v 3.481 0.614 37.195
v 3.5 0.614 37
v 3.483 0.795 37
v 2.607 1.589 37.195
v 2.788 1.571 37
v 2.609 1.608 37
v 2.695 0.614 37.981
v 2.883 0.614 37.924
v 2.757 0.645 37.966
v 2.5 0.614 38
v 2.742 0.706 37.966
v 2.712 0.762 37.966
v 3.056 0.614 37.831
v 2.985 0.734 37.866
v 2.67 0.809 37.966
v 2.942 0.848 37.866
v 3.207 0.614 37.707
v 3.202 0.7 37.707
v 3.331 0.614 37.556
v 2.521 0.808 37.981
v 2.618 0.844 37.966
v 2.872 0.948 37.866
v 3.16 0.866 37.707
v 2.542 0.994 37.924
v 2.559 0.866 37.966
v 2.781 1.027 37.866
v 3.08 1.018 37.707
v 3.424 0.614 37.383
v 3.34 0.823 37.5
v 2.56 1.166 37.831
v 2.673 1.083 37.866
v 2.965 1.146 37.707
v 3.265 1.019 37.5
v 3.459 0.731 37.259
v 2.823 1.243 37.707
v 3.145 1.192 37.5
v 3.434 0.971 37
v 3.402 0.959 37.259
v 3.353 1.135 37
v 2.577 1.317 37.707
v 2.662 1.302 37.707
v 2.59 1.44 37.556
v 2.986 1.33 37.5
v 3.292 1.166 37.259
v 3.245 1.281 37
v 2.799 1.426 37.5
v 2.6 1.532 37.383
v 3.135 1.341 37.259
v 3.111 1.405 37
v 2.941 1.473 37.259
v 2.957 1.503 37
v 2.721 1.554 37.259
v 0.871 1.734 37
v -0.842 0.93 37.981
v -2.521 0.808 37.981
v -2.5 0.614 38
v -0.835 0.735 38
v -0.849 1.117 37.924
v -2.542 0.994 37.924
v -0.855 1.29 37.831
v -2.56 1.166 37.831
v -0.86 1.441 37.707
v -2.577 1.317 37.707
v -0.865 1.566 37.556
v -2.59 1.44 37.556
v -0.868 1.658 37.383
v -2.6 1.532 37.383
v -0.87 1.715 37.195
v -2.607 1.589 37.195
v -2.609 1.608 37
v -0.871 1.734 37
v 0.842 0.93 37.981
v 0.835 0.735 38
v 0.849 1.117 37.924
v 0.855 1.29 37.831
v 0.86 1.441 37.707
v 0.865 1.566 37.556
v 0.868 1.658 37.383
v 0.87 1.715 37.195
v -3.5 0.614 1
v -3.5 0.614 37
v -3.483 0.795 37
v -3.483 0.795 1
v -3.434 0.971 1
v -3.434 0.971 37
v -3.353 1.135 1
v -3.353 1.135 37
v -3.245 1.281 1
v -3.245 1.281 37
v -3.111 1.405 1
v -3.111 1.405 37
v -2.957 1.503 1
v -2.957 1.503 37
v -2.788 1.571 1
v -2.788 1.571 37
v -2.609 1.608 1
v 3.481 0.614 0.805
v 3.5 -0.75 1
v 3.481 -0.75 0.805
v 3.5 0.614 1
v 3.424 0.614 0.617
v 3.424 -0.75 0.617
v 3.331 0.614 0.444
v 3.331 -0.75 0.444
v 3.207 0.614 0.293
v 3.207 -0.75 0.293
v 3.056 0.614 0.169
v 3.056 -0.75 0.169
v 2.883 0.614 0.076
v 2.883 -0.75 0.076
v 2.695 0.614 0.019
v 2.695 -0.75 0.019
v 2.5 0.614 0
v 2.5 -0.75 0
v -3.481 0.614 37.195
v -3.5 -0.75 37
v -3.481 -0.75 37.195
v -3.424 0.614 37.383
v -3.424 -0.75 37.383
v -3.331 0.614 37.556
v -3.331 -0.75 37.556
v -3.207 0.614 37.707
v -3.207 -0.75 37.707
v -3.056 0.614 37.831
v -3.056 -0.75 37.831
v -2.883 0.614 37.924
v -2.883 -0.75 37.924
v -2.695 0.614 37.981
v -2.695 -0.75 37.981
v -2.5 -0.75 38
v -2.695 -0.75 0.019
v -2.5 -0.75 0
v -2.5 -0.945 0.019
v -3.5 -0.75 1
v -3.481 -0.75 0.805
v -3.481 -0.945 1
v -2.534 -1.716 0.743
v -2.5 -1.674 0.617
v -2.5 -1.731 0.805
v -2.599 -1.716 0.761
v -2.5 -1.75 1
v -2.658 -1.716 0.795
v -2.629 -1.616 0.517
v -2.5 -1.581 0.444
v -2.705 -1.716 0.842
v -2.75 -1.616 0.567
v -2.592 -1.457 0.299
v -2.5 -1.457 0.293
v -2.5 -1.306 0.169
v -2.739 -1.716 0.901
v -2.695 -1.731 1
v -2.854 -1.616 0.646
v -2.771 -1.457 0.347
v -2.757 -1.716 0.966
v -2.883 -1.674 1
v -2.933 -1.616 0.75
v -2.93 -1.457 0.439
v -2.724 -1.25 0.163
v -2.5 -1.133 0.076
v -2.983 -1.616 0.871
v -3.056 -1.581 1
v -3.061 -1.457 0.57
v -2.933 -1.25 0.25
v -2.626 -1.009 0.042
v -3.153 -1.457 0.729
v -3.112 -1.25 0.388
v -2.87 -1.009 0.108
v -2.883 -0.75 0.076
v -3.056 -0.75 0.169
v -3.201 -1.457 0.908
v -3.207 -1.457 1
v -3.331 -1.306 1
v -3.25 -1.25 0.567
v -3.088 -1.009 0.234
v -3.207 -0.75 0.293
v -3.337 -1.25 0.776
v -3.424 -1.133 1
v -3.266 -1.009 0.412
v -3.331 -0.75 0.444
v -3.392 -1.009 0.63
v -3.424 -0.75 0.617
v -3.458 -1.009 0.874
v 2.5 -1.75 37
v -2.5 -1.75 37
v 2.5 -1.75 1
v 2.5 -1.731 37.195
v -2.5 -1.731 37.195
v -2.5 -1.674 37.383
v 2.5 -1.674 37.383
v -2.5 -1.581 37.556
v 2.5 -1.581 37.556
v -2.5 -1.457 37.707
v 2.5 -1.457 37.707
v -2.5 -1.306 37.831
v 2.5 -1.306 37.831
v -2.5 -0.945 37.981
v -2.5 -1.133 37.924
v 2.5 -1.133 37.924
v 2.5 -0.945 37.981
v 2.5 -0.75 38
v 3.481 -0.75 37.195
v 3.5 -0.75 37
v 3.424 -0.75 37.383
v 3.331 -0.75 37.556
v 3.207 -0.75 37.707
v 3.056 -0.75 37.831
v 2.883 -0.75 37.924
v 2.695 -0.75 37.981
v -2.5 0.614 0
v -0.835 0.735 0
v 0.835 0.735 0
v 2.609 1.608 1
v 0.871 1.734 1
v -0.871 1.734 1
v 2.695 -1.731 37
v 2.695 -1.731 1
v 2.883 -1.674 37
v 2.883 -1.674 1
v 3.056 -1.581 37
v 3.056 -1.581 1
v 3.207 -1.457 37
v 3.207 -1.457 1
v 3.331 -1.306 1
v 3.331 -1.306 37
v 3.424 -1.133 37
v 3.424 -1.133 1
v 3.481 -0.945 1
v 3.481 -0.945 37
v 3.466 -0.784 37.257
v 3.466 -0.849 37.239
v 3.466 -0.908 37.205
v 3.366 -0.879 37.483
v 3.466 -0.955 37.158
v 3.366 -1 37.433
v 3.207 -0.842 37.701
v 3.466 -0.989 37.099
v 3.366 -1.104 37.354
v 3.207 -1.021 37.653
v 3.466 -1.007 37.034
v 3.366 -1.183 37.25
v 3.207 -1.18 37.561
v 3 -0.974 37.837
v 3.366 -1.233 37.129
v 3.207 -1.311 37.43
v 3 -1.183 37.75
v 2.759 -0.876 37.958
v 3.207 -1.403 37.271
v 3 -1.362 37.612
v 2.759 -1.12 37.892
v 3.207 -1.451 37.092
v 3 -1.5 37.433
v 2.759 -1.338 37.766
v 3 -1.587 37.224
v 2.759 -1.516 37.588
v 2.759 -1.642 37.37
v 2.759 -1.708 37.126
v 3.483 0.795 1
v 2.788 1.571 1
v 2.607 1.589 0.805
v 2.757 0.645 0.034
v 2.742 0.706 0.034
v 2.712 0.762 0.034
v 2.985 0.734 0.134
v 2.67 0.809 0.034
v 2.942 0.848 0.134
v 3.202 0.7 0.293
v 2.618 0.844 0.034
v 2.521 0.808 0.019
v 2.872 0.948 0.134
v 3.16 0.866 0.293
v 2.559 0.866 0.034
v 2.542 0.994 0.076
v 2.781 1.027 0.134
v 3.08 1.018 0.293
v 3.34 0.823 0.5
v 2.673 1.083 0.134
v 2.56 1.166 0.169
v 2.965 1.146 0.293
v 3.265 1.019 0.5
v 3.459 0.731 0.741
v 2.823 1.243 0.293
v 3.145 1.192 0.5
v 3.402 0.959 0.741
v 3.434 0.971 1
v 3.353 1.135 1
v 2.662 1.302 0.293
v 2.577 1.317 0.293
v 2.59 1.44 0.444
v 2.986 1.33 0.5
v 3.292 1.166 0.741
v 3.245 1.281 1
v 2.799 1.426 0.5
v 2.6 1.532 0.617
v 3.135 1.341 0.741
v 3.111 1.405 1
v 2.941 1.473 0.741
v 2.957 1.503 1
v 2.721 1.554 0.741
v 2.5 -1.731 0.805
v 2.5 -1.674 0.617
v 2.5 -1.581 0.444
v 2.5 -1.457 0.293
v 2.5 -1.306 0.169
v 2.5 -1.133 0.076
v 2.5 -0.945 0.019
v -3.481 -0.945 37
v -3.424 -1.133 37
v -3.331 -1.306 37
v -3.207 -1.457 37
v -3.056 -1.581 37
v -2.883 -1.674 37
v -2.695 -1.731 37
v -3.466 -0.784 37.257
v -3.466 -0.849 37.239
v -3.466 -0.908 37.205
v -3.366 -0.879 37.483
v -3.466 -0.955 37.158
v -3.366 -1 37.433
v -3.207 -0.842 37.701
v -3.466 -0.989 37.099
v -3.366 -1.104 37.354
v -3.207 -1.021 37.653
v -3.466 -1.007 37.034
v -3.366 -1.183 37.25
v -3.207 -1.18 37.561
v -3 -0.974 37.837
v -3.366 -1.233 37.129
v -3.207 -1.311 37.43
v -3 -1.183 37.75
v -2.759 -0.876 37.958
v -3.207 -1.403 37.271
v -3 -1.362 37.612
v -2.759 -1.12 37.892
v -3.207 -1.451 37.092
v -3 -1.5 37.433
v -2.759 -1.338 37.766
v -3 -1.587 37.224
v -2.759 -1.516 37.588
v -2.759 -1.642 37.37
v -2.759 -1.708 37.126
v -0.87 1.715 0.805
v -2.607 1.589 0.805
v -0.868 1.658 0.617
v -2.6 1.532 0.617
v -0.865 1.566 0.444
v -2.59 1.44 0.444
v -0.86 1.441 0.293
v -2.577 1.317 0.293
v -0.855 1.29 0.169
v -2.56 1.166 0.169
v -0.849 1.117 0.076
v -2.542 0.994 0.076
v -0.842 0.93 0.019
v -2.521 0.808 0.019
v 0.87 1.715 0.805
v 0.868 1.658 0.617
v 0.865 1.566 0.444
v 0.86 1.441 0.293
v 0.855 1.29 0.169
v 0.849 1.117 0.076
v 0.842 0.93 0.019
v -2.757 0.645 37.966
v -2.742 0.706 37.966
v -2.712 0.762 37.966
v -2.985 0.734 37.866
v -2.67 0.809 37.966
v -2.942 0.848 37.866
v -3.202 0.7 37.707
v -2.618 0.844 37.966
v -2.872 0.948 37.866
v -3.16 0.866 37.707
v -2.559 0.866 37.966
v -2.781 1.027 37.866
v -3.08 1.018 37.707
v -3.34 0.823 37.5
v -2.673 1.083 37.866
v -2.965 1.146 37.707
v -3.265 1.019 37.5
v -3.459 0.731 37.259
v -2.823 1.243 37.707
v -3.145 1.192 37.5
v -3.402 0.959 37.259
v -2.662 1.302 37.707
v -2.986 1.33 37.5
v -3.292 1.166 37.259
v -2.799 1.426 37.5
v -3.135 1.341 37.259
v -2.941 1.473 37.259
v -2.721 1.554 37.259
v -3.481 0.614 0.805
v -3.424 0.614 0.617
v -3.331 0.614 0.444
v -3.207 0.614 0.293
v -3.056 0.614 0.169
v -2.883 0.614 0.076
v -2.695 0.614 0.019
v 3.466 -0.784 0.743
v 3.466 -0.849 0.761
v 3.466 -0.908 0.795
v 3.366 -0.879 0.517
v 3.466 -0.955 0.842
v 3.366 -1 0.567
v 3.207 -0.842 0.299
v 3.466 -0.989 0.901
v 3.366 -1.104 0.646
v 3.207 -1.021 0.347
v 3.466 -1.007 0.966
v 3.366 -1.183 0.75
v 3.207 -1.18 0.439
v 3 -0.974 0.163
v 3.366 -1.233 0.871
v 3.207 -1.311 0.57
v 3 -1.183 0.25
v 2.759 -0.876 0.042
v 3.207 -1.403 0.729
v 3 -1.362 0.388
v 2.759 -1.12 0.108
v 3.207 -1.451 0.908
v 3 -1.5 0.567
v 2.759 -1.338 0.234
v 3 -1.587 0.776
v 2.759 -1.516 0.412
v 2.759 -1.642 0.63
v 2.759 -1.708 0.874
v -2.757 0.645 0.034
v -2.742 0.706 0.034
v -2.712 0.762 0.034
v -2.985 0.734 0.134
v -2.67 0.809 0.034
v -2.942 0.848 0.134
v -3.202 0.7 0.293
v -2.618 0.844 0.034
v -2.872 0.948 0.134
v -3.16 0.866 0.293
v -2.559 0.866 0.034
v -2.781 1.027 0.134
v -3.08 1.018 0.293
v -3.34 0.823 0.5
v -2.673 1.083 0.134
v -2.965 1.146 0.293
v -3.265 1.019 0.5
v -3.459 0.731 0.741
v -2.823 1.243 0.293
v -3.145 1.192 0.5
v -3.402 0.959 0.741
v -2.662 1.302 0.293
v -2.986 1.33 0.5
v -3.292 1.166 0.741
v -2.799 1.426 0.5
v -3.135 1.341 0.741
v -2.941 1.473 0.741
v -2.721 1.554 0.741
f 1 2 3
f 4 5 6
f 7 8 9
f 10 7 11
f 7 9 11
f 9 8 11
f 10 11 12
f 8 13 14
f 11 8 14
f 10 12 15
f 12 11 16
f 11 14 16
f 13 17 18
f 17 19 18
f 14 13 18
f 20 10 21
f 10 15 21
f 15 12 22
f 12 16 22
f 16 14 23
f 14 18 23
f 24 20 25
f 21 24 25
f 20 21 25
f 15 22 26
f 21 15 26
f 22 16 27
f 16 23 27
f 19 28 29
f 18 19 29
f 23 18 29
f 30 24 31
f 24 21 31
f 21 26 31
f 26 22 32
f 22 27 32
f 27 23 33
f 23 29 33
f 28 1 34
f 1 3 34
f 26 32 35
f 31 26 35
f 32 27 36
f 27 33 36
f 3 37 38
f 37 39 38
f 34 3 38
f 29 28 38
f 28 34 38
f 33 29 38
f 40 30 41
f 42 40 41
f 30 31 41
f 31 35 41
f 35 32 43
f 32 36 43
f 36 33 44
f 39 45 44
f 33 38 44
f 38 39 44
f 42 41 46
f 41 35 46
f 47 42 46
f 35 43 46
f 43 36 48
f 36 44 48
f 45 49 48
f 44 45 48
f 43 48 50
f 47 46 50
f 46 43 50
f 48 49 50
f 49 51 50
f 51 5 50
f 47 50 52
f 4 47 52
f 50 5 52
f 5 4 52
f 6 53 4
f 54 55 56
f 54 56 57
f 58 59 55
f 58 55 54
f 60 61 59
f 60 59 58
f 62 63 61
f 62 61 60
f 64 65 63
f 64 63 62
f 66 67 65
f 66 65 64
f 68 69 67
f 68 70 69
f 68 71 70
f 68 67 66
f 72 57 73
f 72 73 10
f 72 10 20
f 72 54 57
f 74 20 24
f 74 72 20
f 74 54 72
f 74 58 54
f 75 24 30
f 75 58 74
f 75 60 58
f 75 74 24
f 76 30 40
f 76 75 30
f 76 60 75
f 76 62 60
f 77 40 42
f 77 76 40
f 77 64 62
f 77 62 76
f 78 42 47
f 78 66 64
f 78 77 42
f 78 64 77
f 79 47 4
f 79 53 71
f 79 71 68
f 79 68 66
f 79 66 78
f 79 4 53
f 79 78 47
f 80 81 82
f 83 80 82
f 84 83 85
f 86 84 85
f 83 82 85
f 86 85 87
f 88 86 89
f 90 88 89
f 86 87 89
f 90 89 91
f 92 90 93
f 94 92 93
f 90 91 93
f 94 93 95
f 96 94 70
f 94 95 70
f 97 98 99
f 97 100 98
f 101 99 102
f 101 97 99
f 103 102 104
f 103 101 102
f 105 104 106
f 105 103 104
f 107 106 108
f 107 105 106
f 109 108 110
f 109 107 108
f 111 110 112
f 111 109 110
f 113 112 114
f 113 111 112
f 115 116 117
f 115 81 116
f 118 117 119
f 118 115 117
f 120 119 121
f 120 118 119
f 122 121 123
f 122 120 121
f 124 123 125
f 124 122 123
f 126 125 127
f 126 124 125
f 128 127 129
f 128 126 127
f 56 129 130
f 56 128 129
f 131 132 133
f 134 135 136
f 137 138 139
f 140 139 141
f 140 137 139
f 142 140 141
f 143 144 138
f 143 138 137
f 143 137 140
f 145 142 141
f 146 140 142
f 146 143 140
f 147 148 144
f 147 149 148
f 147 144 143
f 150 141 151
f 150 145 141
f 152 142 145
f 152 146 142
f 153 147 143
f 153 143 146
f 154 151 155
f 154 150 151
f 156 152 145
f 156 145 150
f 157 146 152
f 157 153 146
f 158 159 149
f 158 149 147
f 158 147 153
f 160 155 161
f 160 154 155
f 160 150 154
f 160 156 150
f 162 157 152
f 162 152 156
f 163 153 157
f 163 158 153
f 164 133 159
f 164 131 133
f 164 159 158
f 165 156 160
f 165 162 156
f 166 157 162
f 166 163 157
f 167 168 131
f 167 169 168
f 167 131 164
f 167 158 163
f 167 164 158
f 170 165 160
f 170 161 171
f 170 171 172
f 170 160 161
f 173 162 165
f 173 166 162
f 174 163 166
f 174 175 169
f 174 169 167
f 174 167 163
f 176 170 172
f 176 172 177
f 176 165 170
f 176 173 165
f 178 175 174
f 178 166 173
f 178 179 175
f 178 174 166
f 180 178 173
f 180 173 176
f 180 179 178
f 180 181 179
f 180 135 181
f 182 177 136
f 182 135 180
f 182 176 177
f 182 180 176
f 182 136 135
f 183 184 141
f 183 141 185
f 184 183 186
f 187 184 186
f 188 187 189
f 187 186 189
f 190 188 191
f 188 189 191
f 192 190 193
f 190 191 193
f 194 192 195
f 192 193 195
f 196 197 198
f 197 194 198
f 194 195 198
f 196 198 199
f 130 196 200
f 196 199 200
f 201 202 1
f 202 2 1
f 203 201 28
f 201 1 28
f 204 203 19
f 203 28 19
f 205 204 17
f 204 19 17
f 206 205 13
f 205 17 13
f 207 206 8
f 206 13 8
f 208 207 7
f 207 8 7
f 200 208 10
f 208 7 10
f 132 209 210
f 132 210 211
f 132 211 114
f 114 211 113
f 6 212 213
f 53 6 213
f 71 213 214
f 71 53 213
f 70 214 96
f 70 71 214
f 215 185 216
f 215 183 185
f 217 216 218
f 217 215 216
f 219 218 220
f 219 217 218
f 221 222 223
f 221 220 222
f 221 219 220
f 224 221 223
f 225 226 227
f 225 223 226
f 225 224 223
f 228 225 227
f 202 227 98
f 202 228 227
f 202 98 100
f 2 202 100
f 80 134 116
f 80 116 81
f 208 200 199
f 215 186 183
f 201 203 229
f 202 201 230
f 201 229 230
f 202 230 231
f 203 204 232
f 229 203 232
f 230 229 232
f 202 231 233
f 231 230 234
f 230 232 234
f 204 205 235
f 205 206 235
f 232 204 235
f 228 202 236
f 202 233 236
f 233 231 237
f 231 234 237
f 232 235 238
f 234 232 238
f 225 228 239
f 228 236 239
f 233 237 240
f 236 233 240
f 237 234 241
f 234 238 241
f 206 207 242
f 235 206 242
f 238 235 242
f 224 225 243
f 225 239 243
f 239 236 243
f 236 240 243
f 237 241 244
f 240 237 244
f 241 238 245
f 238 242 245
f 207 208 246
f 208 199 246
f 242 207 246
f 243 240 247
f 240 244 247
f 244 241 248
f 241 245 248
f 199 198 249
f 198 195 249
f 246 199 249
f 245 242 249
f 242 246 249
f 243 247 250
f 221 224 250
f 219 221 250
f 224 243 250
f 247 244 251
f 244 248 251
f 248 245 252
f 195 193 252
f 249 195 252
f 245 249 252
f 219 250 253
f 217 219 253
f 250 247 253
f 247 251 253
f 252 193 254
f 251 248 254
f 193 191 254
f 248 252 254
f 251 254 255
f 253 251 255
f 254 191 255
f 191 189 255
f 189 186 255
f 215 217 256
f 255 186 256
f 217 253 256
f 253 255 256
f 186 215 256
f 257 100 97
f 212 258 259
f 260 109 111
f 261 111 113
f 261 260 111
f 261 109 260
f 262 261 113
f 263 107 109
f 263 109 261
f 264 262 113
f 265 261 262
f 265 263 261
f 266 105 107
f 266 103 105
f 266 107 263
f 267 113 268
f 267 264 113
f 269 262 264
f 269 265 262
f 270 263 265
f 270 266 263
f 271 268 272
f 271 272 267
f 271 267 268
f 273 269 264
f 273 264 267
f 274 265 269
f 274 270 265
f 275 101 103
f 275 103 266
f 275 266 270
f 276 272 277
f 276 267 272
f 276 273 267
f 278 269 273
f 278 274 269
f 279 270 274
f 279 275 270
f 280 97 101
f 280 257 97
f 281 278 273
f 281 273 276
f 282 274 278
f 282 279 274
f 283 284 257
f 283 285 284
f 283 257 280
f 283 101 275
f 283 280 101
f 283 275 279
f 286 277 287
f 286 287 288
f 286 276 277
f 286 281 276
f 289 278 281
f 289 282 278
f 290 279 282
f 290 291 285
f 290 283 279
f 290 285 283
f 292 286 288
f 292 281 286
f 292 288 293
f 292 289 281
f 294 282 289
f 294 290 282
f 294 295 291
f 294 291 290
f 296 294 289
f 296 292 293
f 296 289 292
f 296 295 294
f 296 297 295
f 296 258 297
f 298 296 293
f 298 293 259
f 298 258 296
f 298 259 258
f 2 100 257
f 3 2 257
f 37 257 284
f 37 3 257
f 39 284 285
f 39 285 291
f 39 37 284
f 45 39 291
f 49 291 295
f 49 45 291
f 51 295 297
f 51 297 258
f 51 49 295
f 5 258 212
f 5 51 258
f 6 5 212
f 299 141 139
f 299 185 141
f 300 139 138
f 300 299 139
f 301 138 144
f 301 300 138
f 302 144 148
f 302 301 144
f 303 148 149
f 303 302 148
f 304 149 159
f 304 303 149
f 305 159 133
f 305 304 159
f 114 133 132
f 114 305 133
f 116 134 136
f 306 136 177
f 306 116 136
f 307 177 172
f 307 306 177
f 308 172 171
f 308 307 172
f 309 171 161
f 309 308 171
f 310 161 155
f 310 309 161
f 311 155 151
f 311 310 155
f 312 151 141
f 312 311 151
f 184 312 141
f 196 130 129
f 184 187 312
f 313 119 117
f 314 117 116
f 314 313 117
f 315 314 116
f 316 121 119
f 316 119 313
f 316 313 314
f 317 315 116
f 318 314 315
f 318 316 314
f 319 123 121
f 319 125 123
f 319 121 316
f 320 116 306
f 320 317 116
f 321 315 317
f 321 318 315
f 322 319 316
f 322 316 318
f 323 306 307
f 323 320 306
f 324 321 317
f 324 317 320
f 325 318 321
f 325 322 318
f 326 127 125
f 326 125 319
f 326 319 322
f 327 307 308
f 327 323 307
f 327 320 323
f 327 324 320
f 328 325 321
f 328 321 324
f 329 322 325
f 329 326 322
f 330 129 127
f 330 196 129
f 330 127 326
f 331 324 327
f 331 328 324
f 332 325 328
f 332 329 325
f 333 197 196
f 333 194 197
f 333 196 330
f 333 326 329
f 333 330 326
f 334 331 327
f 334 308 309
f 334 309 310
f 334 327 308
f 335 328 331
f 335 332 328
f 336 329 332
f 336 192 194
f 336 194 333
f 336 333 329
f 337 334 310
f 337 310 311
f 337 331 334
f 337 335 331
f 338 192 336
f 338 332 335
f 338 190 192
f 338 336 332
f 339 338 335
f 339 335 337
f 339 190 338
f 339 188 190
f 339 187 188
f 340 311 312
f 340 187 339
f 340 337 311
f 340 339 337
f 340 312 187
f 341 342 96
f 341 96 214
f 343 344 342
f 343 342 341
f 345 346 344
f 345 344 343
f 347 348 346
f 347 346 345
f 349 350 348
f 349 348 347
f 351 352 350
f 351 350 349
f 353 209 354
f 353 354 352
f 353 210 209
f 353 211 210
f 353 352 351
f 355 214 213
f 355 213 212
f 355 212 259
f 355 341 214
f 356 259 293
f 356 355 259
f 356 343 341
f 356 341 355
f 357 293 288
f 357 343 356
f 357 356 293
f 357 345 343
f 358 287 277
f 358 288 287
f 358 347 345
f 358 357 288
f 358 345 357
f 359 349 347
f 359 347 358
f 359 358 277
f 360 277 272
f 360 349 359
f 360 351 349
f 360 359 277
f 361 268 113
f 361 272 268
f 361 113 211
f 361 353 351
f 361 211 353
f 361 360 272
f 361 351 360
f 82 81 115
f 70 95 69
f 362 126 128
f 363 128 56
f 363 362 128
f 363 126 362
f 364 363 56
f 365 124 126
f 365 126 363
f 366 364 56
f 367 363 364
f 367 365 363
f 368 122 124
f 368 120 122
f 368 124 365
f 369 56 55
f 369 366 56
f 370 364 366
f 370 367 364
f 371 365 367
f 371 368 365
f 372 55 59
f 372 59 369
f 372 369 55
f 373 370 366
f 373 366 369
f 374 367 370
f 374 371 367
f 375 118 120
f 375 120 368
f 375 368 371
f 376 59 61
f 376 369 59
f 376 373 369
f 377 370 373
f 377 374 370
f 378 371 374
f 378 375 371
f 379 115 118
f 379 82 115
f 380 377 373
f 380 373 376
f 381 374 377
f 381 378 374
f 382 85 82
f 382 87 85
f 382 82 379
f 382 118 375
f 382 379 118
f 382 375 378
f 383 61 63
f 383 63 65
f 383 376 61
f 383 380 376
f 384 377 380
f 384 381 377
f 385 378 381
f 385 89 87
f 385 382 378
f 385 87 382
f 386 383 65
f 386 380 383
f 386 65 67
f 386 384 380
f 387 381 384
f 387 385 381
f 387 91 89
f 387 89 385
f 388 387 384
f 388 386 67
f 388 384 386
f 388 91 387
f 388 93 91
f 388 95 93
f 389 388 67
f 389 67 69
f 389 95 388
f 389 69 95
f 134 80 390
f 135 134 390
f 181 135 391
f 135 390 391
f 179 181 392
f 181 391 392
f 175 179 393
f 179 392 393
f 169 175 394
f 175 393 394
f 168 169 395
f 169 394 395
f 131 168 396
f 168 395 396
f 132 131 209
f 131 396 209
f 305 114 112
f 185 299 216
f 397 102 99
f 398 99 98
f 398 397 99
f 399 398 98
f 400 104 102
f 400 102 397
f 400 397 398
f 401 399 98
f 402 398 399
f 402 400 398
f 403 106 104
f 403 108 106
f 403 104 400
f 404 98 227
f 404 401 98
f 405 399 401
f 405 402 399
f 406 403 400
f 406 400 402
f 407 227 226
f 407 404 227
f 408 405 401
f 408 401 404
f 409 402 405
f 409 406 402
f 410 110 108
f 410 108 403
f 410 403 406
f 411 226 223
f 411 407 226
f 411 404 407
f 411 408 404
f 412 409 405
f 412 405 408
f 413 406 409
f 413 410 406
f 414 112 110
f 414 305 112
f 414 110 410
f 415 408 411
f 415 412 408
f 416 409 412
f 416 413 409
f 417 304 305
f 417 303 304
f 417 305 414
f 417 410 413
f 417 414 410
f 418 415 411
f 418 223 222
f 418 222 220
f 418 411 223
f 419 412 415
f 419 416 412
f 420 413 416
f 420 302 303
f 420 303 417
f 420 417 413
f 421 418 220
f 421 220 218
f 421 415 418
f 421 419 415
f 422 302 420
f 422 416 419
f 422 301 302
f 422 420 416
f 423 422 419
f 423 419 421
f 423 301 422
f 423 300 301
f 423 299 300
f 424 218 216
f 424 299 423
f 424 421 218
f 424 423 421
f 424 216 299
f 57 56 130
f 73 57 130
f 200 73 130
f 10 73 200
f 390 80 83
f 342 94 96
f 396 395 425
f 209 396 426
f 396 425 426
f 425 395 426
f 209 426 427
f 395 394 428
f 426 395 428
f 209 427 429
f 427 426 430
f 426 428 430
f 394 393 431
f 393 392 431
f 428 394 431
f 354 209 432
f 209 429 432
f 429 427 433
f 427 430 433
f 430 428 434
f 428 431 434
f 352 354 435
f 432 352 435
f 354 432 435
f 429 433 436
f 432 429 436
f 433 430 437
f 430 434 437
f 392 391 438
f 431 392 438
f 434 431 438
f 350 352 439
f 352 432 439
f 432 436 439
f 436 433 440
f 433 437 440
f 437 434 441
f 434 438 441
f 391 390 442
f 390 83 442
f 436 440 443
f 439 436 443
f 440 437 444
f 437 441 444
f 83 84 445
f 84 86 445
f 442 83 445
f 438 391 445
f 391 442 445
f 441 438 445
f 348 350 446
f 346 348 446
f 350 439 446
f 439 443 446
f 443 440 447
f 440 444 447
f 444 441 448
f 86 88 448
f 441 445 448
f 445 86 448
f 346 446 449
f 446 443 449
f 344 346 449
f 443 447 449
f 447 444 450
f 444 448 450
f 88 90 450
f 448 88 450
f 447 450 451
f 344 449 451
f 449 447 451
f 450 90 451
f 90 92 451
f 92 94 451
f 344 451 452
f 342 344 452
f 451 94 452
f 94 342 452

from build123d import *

# Parameters (mm, degrees)
SKETCH1_W           = 7
SKETCH1_H           = 3.5
BOSS_EXTRUDE1_DEPTH = 38
SKETCH2_R           = 29
SKETCH2_R_2         = 24
CUT_EXTRUDE1_DEPTH  = 39.200948941
FILLET1_R           = 1


with BuildPart() as part:
    # Sketch1 → Boss-Extrude1 (new body)
    with BuildSketch(Plane.XY):
        Rectangle(SKETCH1_W, SKETCH1_H)
    extrude(amount=BOSS_EXTRUDE1_DEPTH)

    # Sketch2 → Cut-Extrude1 (cut, through all)
    with BuildSketch(Plane.XY.offset(38)):
        with Locations((0, -22.25)):
            Circle(SKETCH2_R)
        with Locations((0, -22.25)):
            Circle(SKETCH2_R_2, mode=Mode.SUBTRACT)
    extrude(amount=-CUT_EXTRUDE1_DEPTH, mode=Mode.SUBTRACT)

    # Fillet1
    fillet1_edges = [part.edges().sort_by_distance(p)[0] for p in [
        (0, -1.75, 38),
        (-3.5, -0.128289929, 0),
        (0, 1.75, 0),
        (-3.5, -0.128289929, 38),
        (0, 1.75, 38),
        (3.5, 1.493420141, 19),
        (-3.5, 1.493420141, 19),
        (3.5, -0.128289929, 38),
        (0, -1.75, 0),
        (3.5, -0.128289929, 0),
        (3.5, -1.75, 19),
        (-3.5, -1.75, 19),
    ]]
    fillet(fillet1_edges, radius=FILLET1_R)


solid = part.part
